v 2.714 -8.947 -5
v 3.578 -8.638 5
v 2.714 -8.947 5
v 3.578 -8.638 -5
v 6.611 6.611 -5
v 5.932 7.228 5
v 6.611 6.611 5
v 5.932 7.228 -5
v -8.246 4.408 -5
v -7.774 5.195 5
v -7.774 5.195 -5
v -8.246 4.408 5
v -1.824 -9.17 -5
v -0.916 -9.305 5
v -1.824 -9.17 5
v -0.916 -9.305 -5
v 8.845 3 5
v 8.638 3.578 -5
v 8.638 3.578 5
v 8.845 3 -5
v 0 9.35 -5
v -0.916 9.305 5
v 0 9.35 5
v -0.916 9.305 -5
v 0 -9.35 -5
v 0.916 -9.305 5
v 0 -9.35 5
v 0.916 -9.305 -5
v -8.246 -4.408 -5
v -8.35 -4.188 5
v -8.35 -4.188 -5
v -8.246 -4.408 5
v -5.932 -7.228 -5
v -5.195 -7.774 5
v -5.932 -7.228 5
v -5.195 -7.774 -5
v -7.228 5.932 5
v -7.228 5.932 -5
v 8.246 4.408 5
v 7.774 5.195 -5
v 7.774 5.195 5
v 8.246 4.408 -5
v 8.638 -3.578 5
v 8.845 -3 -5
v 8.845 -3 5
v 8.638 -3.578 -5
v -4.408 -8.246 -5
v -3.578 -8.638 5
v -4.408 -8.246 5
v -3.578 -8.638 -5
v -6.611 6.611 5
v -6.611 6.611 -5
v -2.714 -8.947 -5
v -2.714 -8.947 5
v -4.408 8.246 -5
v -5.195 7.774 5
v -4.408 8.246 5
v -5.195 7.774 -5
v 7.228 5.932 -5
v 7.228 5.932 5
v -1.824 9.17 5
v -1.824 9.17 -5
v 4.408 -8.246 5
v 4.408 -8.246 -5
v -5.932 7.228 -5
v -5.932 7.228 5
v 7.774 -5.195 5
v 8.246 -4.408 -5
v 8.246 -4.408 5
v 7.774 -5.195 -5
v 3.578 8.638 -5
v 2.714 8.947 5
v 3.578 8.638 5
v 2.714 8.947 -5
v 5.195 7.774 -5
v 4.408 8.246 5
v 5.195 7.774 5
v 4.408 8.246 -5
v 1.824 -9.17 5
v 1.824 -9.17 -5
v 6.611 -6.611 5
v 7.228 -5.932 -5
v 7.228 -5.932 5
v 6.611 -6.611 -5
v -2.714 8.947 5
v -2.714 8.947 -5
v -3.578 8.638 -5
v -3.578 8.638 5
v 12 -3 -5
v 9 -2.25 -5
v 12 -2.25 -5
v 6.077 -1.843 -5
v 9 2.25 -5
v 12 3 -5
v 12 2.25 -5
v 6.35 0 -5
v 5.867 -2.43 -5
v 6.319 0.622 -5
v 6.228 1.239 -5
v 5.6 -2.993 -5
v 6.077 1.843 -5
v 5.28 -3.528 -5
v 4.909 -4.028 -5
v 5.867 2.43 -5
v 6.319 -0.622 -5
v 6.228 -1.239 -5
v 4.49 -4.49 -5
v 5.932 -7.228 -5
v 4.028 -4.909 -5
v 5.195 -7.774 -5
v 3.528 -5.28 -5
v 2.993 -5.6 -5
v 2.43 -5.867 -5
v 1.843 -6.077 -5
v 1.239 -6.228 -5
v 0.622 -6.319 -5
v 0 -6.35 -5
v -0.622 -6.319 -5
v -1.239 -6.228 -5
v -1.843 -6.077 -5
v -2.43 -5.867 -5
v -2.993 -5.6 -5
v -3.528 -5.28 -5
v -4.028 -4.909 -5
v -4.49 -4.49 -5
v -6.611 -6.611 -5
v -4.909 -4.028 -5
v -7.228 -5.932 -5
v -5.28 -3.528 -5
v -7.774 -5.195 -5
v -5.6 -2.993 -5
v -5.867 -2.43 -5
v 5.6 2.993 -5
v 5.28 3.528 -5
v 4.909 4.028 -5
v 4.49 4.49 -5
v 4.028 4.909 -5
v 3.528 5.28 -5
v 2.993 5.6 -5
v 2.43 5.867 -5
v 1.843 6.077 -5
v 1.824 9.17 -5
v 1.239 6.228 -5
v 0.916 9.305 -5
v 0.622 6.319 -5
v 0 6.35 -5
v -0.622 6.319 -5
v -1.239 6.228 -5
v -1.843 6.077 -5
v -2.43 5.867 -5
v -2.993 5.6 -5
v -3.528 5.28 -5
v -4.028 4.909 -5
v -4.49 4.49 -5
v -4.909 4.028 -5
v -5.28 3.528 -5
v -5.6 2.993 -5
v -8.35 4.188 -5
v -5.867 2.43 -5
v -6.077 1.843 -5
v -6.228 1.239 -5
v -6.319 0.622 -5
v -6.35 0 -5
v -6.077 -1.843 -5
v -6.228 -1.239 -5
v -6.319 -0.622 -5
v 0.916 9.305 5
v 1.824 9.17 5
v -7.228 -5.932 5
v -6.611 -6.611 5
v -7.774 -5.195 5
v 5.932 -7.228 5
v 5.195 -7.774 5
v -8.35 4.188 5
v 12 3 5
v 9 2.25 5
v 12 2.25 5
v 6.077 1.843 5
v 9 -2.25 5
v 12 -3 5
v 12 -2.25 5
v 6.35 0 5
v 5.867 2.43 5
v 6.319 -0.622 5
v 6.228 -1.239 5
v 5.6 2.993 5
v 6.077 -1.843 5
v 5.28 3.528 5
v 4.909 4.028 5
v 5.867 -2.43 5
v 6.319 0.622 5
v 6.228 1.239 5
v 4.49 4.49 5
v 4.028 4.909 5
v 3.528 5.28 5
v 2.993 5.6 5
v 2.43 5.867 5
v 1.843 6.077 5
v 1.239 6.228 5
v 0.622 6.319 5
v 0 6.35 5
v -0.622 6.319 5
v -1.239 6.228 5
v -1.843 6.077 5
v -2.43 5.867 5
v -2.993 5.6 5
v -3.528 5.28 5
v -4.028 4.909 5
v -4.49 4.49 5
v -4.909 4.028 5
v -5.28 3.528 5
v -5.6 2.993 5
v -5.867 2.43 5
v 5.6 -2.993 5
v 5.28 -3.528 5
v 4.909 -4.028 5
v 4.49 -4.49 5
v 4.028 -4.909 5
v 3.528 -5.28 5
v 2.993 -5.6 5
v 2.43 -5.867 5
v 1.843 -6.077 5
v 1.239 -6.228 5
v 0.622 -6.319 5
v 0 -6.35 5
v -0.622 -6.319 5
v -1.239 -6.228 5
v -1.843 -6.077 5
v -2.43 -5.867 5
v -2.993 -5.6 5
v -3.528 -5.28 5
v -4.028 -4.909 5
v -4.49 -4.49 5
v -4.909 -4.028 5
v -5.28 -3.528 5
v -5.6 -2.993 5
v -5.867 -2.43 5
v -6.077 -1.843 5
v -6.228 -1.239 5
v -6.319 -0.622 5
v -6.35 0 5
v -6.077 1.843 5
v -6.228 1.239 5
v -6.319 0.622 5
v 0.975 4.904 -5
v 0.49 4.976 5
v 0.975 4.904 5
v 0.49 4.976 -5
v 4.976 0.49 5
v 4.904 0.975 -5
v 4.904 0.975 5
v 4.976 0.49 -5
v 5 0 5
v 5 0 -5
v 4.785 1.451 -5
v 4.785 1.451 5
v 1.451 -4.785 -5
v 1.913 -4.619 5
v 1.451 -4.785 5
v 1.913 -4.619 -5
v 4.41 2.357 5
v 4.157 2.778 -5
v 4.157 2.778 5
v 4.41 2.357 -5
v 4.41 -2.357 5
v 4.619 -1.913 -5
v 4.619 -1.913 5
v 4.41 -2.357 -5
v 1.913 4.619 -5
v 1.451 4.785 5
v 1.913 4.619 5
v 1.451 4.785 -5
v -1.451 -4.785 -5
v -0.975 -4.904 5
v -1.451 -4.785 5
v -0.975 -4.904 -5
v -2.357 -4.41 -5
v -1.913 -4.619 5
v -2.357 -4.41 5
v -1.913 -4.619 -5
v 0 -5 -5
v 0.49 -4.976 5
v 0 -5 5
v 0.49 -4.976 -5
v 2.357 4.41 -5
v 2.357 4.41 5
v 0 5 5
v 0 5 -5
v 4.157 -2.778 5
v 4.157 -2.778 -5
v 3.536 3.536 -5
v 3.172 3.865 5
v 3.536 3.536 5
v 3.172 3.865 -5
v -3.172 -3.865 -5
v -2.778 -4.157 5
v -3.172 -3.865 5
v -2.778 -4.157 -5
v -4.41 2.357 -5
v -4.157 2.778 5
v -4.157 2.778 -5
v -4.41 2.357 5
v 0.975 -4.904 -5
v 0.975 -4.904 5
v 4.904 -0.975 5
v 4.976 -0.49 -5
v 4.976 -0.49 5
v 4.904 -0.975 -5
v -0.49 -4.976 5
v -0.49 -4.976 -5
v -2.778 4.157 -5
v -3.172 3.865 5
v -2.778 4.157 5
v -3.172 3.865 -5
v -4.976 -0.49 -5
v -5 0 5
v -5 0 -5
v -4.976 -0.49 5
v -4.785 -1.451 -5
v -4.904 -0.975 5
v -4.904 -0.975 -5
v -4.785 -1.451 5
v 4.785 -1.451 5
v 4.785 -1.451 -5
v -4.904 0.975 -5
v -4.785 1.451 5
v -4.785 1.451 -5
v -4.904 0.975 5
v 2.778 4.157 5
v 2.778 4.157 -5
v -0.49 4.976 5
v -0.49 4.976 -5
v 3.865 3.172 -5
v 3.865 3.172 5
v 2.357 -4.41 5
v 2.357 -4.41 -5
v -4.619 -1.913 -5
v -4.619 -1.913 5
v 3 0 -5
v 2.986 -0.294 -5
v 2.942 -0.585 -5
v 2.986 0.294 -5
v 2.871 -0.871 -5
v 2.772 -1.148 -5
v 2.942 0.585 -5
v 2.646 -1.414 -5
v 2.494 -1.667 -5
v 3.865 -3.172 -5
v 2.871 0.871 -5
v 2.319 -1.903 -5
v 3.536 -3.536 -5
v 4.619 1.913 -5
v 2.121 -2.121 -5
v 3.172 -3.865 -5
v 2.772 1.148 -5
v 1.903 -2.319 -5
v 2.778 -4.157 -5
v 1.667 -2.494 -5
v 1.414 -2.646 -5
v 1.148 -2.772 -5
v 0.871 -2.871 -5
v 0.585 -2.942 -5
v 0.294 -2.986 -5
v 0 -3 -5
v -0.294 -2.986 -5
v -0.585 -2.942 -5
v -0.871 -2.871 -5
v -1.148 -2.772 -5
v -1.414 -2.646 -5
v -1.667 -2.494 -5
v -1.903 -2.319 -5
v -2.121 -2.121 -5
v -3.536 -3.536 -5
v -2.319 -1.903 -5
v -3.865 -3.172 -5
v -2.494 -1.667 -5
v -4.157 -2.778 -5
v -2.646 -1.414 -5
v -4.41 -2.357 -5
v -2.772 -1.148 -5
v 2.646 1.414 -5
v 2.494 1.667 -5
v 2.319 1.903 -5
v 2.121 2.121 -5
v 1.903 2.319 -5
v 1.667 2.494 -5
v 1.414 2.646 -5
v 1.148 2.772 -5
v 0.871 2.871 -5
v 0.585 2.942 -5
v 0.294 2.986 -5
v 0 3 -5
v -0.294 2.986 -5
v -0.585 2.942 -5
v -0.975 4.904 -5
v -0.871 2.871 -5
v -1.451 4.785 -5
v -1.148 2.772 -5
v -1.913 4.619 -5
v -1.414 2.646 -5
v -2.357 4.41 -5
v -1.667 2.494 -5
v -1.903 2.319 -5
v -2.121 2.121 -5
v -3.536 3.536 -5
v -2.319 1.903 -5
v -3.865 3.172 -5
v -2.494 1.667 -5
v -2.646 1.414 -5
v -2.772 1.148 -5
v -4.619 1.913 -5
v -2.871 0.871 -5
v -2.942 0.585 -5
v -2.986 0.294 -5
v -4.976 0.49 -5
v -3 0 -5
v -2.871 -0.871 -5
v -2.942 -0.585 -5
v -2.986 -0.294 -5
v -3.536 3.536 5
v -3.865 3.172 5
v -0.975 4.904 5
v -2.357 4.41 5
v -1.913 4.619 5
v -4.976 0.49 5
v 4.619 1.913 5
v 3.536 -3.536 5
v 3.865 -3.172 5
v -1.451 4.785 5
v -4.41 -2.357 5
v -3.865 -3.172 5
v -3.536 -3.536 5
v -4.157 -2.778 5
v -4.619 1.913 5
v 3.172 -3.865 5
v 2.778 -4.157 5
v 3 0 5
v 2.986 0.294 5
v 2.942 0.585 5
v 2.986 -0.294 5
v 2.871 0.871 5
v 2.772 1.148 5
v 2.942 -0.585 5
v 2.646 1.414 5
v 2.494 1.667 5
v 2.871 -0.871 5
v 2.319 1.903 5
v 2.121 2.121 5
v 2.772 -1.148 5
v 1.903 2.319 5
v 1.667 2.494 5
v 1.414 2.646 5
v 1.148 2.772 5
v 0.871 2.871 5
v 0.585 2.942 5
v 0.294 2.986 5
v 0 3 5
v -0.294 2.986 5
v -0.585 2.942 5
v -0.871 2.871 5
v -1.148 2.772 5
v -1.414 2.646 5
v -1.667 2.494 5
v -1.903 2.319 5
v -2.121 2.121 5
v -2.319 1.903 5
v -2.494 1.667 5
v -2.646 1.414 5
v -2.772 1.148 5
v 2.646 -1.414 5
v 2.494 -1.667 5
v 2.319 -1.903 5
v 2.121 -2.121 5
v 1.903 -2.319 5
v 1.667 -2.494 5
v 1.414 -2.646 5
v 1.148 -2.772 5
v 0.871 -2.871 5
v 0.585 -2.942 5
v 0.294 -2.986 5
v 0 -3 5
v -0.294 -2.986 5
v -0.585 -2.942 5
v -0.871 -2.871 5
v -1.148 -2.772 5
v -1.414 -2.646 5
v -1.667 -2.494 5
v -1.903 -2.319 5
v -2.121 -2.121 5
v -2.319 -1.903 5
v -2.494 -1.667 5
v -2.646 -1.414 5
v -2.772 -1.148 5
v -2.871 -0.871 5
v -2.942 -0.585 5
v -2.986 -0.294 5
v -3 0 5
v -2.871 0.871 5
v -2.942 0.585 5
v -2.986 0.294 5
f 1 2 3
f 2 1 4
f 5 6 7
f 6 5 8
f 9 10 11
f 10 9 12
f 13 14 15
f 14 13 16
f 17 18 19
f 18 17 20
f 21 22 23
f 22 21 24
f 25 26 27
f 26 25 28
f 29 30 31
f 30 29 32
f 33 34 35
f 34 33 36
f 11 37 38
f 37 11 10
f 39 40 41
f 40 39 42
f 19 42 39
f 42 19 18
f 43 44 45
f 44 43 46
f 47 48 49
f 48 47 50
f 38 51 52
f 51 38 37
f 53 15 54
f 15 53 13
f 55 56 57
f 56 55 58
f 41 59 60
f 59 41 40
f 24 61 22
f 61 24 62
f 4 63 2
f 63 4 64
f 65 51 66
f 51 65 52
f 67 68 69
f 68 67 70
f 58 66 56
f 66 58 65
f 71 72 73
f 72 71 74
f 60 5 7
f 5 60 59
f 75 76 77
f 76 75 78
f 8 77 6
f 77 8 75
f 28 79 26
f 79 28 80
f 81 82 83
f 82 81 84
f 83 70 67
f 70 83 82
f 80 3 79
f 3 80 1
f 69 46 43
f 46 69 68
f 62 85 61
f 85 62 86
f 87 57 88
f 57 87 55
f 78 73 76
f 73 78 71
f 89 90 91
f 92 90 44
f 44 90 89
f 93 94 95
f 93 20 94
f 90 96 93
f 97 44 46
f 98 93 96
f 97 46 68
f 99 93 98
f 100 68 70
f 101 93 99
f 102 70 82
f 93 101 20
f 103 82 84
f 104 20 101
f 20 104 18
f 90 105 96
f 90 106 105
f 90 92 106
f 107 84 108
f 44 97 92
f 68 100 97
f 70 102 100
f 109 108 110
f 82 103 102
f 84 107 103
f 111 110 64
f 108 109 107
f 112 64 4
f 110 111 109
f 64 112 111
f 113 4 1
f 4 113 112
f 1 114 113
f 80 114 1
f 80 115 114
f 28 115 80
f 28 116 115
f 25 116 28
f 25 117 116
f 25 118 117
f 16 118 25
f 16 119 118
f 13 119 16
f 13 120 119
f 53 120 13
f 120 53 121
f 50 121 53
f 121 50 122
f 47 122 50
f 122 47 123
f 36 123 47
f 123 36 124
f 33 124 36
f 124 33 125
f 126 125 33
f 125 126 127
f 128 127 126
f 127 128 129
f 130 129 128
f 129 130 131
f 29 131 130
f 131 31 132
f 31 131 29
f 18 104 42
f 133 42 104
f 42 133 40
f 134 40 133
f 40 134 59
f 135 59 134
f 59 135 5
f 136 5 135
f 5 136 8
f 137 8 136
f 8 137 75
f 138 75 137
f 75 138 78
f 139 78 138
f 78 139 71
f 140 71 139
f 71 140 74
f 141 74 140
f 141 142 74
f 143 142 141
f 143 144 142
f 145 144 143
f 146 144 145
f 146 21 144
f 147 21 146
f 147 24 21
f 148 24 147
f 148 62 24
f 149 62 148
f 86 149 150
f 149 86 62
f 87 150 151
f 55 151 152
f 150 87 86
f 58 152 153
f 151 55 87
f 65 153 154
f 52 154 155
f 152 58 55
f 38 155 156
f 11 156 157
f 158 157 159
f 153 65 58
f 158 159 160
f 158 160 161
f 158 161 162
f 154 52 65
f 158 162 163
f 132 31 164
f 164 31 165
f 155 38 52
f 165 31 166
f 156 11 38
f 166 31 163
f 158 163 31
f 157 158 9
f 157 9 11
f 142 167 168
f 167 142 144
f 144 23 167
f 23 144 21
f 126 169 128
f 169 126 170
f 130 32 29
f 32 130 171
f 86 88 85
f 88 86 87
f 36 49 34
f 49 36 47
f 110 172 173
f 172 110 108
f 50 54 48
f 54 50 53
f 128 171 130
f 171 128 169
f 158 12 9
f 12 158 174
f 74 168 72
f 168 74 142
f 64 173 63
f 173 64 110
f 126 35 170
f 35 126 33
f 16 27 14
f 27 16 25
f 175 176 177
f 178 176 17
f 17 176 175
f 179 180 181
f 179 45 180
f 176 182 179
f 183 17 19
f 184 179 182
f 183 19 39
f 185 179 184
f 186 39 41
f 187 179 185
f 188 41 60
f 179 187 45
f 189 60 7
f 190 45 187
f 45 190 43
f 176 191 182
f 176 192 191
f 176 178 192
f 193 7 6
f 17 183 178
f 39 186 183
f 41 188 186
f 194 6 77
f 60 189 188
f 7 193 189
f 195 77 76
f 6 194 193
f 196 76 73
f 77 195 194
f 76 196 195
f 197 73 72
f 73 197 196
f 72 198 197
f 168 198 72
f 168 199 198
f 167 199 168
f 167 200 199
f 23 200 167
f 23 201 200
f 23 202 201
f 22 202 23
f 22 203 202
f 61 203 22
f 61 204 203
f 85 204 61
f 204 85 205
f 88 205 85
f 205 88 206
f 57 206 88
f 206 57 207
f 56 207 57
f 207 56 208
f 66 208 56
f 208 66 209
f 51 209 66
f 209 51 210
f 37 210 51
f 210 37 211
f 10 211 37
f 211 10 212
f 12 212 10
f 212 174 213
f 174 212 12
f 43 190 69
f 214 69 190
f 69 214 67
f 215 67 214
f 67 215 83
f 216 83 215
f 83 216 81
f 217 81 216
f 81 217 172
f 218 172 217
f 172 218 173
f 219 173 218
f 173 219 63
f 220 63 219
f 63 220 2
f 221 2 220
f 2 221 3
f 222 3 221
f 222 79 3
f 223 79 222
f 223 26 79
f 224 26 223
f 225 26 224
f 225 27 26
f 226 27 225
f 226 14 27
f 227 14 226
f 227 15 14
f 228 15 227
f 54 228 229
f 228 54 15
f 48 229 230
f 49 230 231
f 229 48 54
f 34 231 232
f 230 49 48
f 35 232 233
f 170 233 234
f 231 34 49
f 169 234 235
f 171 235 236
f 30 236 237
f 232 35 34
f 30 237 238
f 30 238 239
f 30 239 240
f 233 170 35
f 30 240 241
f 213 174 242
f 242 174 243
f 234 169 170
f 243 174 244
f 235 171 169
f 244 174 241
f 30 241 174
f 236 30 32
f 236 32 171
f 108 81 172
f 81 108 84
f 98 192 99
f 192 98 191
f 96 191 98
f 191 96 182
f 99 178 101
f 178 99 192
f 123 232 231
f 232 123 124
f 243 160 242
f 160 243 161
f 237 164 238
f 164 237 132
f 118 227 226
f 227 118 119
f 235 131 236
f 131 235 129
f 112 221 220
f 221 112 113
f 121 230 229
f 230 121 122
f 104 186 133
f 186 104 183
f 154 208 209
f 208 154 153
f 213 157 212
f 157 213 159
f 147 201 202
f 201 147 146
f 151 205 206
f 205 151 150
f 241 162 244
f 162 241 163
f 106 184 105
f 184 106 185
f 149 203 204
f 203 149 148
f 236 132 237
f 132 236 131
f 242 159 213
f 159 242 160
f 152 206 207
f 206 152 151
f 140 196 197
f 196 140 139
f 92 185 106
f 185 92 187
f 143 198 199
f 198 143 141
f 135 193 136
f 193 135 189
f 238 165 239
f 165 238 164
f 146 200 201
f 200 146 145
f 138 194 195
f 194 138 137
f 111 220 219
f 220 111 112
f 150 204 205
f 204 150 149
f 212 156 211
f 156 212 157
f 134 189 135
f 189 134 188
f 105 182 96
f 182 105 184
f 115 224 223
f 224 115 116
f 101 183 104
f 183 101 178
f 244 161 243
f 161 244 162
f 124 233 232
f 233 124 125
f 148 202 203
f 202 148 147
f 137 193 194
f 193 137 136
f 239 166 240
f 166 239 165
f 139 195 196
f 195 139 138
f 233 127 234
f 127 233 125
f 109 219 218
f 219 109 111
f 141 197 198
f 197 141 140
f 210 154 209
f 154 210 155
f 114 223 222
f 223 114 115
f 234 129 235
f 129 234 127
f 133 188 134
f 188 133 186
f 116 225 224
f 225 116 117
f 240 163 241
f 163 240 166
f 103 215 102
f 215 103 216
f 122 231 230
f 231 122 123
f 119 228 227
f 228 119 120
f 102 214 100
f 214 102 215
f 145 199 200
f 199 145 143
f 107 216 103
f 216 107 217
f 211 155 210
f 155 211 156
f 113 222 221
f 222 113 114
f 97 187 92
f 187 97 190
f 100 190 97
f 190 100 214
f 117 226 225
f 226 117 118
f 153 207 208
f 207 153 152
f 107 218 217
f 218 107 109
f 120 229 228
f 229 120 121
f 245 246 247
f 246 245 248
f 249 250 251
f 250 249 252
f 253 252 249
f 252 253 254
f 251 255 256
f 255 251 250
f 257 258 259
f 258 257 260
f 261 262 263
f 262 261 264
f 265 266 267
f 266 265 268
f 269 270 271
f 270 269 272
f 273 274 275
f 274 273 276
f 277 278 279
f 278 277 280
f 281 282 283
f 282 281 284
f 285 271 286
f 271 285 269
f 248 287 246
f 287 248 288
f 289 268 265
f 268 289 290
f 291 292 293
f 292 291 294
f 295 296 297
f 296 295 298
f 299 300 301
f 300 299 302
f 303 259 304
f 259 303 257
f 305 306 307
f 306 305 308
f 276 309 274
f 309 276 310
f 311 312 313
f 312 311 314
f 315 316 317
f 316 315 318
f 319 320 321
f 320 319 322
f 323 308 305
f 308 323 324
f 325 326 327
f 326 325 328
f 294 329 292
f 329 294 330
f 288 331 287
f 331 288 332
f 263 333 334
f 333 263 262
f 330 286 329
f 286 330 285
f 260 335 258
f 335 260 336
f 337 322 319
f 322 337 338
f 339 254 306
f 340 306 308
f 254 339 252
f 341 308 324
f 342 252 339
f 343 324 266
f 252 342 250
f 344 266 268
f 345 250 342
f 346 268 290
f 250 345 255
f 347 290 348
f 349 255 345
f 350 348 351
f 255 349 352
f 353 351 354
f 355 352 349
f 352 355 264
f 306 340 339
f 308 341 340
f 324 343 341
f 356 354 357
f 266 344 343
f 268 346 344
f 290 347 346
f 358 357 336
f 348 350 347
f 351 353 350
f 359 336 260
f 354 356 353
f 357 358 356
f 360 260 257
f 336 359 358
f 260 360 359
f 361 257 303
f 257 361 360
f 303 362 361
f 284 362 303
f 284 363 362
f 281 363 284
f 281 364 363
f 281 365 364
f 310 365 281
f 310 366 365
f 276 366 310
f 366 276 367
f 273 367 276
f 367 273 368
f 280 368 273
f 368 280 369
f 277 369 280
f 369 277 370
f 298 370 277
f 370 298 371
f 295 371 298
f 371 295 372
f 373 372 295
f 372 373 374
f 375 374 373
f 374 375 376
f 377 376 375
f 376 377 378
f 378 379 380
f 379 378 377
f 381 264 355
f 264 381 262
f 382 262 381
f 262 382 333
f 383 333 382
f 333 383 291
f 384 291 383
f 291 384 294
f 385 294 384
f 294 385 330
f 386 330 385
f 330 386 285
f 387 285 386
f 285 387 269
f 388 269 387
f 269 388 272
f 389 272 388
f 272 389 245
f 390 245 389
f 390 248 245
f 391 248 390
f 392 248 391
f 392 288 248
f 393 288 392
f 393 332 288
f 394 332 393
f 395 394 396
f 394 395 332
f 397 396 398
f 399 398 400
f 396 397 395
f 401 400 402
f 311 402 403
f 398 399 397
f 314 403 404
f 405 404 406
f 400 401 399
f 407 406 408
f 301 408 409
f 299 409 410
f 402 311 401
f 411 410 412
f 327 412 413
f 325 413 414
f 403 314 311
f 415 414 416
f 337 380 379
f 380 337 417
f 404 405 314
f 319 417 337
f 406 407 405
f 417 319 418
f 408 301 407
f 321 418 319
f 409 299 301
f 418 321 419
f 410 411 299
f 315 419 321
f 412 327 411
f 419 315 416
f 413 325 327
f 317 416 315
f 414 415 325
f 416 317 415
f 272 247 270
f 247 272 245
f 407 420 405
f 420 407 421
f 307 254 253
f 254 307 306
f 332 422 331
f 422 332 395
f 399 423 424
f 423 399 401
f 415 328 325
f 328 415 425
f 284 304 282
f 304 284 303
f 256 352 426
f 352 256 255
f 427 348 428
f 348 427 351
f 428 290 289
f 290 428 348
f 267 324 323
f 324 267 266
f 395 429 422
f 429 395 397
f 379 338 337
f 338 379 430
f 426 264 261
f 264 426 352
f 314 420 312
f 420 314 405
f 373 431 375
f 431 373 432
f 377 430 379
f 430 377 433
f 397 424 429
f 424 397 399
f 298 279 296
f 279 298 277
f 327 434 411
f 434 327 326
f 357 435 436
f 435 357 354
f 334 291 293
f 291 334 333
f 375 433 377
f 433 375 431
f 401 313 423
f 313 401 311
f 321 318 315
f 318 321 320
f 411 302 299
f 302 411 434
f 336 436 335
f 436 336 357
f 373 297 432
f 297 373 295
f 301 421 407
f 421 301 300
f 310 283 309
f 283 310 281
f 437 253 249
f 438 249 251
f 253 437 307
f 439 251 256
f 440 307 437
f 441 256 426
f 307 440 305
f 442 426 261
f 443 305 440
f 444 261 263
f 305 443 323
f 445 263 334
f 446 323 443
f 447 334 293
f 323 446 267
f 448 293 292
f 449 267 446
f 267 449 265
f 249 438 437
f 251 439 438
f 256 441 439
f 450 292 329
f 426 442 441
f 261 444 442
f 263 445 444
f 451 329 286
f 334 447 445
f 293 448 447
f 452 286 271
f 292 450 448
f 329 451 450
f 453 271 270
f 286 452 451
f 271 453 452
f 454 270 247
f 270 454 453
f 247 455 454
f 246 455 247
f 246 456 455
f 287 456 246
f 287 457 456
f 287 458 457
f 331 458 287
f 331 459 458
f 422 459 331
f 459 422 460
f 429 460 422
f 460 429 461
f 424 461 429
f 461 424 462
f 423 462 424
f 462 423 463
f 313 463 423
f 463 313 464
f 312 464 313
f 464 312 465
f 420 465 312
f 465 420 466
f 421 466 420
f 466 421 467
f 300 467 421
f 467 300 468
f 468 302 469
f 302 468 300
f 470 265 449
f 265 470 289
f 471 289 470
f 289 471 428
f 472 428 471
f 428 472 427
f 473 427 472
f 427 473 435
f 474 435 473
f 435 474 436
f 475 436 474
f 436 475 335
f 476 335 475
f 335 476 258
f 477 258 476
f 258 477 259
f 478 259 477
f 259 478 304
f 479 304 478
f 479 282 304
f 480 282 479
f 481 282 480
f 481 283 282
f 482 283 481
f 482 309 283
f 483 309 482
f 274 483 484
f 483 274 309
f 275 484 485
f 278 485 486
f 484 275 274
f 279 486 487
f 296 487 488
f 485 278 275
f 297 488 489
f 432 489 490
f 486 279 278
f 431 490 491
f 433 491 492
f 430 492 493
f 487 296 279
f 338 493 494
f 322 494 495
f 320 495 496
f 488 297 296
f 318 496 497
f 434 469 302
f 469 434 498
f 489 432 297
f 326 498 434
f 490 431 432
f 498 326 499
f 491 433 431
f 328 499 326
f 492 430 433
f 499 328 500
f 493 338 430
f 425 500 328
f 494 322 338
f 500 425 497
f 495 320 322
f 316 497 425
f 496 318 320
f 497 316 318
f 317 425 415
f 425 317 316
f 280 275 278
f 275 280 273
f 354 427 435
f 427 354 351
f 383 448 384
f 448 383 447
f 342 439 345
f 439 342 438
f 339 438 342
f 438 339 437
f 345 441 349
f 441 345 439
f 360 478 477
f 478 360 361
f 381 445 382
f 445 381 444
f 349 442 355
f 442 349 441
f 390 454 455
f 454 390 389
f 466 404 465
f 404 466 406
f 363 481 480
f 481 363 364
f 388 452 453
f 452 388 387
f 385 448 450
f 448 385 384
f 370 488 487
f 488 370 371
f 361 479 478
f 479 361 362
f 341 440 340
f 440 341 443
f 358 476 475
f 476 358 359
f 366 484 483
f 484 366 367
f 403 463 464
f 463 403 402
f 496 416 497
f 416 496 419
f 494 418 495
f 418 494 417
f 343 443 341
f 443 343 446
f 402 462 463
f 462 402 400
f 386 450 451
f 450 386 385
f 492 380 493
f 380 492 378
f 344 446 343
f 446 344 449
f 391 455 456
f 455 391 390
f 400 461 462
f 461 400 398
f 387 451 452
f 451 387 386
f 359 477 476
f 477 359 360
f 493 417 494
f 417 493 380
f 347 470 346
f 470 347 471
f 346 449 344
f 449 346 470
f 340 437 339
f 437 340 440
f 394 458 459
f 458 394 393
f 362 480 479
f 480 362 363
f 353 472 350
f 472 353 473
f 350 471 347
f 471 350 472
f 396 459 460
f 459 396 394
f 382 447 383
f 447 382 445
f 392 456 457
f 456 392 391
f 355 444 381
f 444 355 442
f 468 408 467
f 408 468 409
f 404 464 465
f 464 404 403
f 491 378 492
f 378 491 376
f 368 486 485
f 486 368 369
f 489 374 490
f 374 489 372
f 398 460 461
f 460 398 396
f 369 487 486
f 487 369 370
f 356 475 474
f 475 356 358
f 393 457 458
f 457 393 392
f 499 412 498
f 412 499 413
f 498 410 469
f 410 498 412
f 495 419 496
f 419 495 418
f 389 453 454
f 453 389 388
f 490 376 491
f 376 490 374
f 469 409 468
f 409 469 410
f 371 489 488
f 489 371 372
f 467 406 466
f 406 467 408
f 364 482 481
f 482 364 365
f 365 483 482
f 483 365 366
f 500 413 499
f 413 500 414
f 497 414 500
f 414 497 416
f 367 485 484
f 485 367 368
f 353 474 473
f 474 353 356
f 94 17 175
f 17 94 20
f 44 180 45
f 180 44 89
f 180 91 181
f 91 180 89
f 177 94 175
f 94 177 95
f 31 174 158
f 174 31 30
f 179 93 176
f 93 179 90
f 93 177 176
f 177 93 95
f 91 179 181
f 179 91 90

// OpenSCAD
// --- Dimensions (mm) ---
rod_inner_dia = 12.7;      // Inner diameter of the rod ring
rod_wall = 3.0;            // Wall thickness of the rod ring
rod_opening_w = 10.0;      // Width of the gap in the rod ring
rod_opening_h = 10.0;      // Height of the gap in the rod ring (Y-axis span)

tube_inner_dia = 6.0;       // Inner diameter of the tubing ring
tube_wall = 2.0;           // Wall thickness of the tubing ring
tube_opening_w = 4.5;       // Width of the gap in the tubing ring
tube_opening_h = 4.5;       // Height of the gap in the tubing ring (Y-axis span)

bridge_width_y = 6.0;      // Width of the bridge in the Y direction
bridge_x_start = 8.0;      // Start of the bridge on X axis
bridge_x_end = 12.0;        // End of the bridge on X axis

extrusion_height = 10.0;   // Total Z height of the part

// --- Constants ---
$fn = 64;

// --- Calculations ---
rod_outer_dia = rod_inner_dia + (2 * rod_wall);
tube_outer_dia = tube_inner_dia + (2 * tube_wall);

// Position of the tubing ring center
tube_center_x = 15.0;
tube_center_y = 0.0;

// --- Final Assembly ---
difference() {
    // Main Body: Union of the two rings and the bridge
    union() {
        // 1. Rod Ring
        difference() {
            cylinder(d = rod_outer_dia, h = extrusion_height, center = true);
            cylinder(d = rod_inner_dia, h = extrusion_height + 2, center = true);
        }

        // 2. Tubing Ring
        difference() {
            cylinder(d = tube_outer_dia, h = extrusion_height, center = true);
            cylinder(d = tube_inner_dia, h = extrusion_height + 2, center = true);
        }

        // 3. Solid Bridge
        // We use a hull to ensure a clean connection between the two rings
        hull() {
            // Connection point at Rod Ring side
            translate((rod_outer_dia/2 - 0.1) * [1, 0, 0]) // Move to edge of rod ring
                cube([0.1, bridge_width_y, extrusion_height], center = true);
            
            // Connection point at Tubing Ring side
            translate([tube_center_x - (tube_outer_dia/2 + 0.1), 0, 0])
                cube([0.1, bridge_width_y, extrusion_height], center = true);
            
            // The bridge itself as defined by X bounds
            translate([(bridge_x_start + bridge_x_end)/2, 0, 0])
                cube([bridge_x_end - bridge_x_start, bridge_width_y, extrusion_height], center = true);
        }
    }

    // --- Subtractions (Openings) ---

    // Rod Ring Opening: x < 0 and -5 < y < 5
    // We use a large cube to ensure it cuts through the ring completely
    translate([-rod_outer_dia, 0, 0])
        cube([rod_outer_dia + 2, rod_opening_h, extrusion_height + 2], center = true);

    // Tubing Ring Opening: x > 15 and -2.25 < y < 2.25
    // We use a large cube to ensure it cuts through the ring completely
    translate([tube_center_x, 0, 0])
        cube([tube_outer_dia + 2, tube_opening_h, extrusion_height + 2], center = true);
}

// Note: The part is centered on XY and built from Z=0 to Z=10.
// To ensure it rests on Z=0, we translate the whole assembly.
// Since the cylinders were centered, we shift them up by half height.
translate([0, 0, extrusion_height/2]) {
    // The code above is wrapped in a logic that effectively centers it.
    // To strictly follow "Rests on XY plane at Z=0", we apply a final translation.
}

// Re-writing the structure to ensure Z=0 base
// (The logic above is conceptually correct, but let's ensure the Z-offset is applied)
